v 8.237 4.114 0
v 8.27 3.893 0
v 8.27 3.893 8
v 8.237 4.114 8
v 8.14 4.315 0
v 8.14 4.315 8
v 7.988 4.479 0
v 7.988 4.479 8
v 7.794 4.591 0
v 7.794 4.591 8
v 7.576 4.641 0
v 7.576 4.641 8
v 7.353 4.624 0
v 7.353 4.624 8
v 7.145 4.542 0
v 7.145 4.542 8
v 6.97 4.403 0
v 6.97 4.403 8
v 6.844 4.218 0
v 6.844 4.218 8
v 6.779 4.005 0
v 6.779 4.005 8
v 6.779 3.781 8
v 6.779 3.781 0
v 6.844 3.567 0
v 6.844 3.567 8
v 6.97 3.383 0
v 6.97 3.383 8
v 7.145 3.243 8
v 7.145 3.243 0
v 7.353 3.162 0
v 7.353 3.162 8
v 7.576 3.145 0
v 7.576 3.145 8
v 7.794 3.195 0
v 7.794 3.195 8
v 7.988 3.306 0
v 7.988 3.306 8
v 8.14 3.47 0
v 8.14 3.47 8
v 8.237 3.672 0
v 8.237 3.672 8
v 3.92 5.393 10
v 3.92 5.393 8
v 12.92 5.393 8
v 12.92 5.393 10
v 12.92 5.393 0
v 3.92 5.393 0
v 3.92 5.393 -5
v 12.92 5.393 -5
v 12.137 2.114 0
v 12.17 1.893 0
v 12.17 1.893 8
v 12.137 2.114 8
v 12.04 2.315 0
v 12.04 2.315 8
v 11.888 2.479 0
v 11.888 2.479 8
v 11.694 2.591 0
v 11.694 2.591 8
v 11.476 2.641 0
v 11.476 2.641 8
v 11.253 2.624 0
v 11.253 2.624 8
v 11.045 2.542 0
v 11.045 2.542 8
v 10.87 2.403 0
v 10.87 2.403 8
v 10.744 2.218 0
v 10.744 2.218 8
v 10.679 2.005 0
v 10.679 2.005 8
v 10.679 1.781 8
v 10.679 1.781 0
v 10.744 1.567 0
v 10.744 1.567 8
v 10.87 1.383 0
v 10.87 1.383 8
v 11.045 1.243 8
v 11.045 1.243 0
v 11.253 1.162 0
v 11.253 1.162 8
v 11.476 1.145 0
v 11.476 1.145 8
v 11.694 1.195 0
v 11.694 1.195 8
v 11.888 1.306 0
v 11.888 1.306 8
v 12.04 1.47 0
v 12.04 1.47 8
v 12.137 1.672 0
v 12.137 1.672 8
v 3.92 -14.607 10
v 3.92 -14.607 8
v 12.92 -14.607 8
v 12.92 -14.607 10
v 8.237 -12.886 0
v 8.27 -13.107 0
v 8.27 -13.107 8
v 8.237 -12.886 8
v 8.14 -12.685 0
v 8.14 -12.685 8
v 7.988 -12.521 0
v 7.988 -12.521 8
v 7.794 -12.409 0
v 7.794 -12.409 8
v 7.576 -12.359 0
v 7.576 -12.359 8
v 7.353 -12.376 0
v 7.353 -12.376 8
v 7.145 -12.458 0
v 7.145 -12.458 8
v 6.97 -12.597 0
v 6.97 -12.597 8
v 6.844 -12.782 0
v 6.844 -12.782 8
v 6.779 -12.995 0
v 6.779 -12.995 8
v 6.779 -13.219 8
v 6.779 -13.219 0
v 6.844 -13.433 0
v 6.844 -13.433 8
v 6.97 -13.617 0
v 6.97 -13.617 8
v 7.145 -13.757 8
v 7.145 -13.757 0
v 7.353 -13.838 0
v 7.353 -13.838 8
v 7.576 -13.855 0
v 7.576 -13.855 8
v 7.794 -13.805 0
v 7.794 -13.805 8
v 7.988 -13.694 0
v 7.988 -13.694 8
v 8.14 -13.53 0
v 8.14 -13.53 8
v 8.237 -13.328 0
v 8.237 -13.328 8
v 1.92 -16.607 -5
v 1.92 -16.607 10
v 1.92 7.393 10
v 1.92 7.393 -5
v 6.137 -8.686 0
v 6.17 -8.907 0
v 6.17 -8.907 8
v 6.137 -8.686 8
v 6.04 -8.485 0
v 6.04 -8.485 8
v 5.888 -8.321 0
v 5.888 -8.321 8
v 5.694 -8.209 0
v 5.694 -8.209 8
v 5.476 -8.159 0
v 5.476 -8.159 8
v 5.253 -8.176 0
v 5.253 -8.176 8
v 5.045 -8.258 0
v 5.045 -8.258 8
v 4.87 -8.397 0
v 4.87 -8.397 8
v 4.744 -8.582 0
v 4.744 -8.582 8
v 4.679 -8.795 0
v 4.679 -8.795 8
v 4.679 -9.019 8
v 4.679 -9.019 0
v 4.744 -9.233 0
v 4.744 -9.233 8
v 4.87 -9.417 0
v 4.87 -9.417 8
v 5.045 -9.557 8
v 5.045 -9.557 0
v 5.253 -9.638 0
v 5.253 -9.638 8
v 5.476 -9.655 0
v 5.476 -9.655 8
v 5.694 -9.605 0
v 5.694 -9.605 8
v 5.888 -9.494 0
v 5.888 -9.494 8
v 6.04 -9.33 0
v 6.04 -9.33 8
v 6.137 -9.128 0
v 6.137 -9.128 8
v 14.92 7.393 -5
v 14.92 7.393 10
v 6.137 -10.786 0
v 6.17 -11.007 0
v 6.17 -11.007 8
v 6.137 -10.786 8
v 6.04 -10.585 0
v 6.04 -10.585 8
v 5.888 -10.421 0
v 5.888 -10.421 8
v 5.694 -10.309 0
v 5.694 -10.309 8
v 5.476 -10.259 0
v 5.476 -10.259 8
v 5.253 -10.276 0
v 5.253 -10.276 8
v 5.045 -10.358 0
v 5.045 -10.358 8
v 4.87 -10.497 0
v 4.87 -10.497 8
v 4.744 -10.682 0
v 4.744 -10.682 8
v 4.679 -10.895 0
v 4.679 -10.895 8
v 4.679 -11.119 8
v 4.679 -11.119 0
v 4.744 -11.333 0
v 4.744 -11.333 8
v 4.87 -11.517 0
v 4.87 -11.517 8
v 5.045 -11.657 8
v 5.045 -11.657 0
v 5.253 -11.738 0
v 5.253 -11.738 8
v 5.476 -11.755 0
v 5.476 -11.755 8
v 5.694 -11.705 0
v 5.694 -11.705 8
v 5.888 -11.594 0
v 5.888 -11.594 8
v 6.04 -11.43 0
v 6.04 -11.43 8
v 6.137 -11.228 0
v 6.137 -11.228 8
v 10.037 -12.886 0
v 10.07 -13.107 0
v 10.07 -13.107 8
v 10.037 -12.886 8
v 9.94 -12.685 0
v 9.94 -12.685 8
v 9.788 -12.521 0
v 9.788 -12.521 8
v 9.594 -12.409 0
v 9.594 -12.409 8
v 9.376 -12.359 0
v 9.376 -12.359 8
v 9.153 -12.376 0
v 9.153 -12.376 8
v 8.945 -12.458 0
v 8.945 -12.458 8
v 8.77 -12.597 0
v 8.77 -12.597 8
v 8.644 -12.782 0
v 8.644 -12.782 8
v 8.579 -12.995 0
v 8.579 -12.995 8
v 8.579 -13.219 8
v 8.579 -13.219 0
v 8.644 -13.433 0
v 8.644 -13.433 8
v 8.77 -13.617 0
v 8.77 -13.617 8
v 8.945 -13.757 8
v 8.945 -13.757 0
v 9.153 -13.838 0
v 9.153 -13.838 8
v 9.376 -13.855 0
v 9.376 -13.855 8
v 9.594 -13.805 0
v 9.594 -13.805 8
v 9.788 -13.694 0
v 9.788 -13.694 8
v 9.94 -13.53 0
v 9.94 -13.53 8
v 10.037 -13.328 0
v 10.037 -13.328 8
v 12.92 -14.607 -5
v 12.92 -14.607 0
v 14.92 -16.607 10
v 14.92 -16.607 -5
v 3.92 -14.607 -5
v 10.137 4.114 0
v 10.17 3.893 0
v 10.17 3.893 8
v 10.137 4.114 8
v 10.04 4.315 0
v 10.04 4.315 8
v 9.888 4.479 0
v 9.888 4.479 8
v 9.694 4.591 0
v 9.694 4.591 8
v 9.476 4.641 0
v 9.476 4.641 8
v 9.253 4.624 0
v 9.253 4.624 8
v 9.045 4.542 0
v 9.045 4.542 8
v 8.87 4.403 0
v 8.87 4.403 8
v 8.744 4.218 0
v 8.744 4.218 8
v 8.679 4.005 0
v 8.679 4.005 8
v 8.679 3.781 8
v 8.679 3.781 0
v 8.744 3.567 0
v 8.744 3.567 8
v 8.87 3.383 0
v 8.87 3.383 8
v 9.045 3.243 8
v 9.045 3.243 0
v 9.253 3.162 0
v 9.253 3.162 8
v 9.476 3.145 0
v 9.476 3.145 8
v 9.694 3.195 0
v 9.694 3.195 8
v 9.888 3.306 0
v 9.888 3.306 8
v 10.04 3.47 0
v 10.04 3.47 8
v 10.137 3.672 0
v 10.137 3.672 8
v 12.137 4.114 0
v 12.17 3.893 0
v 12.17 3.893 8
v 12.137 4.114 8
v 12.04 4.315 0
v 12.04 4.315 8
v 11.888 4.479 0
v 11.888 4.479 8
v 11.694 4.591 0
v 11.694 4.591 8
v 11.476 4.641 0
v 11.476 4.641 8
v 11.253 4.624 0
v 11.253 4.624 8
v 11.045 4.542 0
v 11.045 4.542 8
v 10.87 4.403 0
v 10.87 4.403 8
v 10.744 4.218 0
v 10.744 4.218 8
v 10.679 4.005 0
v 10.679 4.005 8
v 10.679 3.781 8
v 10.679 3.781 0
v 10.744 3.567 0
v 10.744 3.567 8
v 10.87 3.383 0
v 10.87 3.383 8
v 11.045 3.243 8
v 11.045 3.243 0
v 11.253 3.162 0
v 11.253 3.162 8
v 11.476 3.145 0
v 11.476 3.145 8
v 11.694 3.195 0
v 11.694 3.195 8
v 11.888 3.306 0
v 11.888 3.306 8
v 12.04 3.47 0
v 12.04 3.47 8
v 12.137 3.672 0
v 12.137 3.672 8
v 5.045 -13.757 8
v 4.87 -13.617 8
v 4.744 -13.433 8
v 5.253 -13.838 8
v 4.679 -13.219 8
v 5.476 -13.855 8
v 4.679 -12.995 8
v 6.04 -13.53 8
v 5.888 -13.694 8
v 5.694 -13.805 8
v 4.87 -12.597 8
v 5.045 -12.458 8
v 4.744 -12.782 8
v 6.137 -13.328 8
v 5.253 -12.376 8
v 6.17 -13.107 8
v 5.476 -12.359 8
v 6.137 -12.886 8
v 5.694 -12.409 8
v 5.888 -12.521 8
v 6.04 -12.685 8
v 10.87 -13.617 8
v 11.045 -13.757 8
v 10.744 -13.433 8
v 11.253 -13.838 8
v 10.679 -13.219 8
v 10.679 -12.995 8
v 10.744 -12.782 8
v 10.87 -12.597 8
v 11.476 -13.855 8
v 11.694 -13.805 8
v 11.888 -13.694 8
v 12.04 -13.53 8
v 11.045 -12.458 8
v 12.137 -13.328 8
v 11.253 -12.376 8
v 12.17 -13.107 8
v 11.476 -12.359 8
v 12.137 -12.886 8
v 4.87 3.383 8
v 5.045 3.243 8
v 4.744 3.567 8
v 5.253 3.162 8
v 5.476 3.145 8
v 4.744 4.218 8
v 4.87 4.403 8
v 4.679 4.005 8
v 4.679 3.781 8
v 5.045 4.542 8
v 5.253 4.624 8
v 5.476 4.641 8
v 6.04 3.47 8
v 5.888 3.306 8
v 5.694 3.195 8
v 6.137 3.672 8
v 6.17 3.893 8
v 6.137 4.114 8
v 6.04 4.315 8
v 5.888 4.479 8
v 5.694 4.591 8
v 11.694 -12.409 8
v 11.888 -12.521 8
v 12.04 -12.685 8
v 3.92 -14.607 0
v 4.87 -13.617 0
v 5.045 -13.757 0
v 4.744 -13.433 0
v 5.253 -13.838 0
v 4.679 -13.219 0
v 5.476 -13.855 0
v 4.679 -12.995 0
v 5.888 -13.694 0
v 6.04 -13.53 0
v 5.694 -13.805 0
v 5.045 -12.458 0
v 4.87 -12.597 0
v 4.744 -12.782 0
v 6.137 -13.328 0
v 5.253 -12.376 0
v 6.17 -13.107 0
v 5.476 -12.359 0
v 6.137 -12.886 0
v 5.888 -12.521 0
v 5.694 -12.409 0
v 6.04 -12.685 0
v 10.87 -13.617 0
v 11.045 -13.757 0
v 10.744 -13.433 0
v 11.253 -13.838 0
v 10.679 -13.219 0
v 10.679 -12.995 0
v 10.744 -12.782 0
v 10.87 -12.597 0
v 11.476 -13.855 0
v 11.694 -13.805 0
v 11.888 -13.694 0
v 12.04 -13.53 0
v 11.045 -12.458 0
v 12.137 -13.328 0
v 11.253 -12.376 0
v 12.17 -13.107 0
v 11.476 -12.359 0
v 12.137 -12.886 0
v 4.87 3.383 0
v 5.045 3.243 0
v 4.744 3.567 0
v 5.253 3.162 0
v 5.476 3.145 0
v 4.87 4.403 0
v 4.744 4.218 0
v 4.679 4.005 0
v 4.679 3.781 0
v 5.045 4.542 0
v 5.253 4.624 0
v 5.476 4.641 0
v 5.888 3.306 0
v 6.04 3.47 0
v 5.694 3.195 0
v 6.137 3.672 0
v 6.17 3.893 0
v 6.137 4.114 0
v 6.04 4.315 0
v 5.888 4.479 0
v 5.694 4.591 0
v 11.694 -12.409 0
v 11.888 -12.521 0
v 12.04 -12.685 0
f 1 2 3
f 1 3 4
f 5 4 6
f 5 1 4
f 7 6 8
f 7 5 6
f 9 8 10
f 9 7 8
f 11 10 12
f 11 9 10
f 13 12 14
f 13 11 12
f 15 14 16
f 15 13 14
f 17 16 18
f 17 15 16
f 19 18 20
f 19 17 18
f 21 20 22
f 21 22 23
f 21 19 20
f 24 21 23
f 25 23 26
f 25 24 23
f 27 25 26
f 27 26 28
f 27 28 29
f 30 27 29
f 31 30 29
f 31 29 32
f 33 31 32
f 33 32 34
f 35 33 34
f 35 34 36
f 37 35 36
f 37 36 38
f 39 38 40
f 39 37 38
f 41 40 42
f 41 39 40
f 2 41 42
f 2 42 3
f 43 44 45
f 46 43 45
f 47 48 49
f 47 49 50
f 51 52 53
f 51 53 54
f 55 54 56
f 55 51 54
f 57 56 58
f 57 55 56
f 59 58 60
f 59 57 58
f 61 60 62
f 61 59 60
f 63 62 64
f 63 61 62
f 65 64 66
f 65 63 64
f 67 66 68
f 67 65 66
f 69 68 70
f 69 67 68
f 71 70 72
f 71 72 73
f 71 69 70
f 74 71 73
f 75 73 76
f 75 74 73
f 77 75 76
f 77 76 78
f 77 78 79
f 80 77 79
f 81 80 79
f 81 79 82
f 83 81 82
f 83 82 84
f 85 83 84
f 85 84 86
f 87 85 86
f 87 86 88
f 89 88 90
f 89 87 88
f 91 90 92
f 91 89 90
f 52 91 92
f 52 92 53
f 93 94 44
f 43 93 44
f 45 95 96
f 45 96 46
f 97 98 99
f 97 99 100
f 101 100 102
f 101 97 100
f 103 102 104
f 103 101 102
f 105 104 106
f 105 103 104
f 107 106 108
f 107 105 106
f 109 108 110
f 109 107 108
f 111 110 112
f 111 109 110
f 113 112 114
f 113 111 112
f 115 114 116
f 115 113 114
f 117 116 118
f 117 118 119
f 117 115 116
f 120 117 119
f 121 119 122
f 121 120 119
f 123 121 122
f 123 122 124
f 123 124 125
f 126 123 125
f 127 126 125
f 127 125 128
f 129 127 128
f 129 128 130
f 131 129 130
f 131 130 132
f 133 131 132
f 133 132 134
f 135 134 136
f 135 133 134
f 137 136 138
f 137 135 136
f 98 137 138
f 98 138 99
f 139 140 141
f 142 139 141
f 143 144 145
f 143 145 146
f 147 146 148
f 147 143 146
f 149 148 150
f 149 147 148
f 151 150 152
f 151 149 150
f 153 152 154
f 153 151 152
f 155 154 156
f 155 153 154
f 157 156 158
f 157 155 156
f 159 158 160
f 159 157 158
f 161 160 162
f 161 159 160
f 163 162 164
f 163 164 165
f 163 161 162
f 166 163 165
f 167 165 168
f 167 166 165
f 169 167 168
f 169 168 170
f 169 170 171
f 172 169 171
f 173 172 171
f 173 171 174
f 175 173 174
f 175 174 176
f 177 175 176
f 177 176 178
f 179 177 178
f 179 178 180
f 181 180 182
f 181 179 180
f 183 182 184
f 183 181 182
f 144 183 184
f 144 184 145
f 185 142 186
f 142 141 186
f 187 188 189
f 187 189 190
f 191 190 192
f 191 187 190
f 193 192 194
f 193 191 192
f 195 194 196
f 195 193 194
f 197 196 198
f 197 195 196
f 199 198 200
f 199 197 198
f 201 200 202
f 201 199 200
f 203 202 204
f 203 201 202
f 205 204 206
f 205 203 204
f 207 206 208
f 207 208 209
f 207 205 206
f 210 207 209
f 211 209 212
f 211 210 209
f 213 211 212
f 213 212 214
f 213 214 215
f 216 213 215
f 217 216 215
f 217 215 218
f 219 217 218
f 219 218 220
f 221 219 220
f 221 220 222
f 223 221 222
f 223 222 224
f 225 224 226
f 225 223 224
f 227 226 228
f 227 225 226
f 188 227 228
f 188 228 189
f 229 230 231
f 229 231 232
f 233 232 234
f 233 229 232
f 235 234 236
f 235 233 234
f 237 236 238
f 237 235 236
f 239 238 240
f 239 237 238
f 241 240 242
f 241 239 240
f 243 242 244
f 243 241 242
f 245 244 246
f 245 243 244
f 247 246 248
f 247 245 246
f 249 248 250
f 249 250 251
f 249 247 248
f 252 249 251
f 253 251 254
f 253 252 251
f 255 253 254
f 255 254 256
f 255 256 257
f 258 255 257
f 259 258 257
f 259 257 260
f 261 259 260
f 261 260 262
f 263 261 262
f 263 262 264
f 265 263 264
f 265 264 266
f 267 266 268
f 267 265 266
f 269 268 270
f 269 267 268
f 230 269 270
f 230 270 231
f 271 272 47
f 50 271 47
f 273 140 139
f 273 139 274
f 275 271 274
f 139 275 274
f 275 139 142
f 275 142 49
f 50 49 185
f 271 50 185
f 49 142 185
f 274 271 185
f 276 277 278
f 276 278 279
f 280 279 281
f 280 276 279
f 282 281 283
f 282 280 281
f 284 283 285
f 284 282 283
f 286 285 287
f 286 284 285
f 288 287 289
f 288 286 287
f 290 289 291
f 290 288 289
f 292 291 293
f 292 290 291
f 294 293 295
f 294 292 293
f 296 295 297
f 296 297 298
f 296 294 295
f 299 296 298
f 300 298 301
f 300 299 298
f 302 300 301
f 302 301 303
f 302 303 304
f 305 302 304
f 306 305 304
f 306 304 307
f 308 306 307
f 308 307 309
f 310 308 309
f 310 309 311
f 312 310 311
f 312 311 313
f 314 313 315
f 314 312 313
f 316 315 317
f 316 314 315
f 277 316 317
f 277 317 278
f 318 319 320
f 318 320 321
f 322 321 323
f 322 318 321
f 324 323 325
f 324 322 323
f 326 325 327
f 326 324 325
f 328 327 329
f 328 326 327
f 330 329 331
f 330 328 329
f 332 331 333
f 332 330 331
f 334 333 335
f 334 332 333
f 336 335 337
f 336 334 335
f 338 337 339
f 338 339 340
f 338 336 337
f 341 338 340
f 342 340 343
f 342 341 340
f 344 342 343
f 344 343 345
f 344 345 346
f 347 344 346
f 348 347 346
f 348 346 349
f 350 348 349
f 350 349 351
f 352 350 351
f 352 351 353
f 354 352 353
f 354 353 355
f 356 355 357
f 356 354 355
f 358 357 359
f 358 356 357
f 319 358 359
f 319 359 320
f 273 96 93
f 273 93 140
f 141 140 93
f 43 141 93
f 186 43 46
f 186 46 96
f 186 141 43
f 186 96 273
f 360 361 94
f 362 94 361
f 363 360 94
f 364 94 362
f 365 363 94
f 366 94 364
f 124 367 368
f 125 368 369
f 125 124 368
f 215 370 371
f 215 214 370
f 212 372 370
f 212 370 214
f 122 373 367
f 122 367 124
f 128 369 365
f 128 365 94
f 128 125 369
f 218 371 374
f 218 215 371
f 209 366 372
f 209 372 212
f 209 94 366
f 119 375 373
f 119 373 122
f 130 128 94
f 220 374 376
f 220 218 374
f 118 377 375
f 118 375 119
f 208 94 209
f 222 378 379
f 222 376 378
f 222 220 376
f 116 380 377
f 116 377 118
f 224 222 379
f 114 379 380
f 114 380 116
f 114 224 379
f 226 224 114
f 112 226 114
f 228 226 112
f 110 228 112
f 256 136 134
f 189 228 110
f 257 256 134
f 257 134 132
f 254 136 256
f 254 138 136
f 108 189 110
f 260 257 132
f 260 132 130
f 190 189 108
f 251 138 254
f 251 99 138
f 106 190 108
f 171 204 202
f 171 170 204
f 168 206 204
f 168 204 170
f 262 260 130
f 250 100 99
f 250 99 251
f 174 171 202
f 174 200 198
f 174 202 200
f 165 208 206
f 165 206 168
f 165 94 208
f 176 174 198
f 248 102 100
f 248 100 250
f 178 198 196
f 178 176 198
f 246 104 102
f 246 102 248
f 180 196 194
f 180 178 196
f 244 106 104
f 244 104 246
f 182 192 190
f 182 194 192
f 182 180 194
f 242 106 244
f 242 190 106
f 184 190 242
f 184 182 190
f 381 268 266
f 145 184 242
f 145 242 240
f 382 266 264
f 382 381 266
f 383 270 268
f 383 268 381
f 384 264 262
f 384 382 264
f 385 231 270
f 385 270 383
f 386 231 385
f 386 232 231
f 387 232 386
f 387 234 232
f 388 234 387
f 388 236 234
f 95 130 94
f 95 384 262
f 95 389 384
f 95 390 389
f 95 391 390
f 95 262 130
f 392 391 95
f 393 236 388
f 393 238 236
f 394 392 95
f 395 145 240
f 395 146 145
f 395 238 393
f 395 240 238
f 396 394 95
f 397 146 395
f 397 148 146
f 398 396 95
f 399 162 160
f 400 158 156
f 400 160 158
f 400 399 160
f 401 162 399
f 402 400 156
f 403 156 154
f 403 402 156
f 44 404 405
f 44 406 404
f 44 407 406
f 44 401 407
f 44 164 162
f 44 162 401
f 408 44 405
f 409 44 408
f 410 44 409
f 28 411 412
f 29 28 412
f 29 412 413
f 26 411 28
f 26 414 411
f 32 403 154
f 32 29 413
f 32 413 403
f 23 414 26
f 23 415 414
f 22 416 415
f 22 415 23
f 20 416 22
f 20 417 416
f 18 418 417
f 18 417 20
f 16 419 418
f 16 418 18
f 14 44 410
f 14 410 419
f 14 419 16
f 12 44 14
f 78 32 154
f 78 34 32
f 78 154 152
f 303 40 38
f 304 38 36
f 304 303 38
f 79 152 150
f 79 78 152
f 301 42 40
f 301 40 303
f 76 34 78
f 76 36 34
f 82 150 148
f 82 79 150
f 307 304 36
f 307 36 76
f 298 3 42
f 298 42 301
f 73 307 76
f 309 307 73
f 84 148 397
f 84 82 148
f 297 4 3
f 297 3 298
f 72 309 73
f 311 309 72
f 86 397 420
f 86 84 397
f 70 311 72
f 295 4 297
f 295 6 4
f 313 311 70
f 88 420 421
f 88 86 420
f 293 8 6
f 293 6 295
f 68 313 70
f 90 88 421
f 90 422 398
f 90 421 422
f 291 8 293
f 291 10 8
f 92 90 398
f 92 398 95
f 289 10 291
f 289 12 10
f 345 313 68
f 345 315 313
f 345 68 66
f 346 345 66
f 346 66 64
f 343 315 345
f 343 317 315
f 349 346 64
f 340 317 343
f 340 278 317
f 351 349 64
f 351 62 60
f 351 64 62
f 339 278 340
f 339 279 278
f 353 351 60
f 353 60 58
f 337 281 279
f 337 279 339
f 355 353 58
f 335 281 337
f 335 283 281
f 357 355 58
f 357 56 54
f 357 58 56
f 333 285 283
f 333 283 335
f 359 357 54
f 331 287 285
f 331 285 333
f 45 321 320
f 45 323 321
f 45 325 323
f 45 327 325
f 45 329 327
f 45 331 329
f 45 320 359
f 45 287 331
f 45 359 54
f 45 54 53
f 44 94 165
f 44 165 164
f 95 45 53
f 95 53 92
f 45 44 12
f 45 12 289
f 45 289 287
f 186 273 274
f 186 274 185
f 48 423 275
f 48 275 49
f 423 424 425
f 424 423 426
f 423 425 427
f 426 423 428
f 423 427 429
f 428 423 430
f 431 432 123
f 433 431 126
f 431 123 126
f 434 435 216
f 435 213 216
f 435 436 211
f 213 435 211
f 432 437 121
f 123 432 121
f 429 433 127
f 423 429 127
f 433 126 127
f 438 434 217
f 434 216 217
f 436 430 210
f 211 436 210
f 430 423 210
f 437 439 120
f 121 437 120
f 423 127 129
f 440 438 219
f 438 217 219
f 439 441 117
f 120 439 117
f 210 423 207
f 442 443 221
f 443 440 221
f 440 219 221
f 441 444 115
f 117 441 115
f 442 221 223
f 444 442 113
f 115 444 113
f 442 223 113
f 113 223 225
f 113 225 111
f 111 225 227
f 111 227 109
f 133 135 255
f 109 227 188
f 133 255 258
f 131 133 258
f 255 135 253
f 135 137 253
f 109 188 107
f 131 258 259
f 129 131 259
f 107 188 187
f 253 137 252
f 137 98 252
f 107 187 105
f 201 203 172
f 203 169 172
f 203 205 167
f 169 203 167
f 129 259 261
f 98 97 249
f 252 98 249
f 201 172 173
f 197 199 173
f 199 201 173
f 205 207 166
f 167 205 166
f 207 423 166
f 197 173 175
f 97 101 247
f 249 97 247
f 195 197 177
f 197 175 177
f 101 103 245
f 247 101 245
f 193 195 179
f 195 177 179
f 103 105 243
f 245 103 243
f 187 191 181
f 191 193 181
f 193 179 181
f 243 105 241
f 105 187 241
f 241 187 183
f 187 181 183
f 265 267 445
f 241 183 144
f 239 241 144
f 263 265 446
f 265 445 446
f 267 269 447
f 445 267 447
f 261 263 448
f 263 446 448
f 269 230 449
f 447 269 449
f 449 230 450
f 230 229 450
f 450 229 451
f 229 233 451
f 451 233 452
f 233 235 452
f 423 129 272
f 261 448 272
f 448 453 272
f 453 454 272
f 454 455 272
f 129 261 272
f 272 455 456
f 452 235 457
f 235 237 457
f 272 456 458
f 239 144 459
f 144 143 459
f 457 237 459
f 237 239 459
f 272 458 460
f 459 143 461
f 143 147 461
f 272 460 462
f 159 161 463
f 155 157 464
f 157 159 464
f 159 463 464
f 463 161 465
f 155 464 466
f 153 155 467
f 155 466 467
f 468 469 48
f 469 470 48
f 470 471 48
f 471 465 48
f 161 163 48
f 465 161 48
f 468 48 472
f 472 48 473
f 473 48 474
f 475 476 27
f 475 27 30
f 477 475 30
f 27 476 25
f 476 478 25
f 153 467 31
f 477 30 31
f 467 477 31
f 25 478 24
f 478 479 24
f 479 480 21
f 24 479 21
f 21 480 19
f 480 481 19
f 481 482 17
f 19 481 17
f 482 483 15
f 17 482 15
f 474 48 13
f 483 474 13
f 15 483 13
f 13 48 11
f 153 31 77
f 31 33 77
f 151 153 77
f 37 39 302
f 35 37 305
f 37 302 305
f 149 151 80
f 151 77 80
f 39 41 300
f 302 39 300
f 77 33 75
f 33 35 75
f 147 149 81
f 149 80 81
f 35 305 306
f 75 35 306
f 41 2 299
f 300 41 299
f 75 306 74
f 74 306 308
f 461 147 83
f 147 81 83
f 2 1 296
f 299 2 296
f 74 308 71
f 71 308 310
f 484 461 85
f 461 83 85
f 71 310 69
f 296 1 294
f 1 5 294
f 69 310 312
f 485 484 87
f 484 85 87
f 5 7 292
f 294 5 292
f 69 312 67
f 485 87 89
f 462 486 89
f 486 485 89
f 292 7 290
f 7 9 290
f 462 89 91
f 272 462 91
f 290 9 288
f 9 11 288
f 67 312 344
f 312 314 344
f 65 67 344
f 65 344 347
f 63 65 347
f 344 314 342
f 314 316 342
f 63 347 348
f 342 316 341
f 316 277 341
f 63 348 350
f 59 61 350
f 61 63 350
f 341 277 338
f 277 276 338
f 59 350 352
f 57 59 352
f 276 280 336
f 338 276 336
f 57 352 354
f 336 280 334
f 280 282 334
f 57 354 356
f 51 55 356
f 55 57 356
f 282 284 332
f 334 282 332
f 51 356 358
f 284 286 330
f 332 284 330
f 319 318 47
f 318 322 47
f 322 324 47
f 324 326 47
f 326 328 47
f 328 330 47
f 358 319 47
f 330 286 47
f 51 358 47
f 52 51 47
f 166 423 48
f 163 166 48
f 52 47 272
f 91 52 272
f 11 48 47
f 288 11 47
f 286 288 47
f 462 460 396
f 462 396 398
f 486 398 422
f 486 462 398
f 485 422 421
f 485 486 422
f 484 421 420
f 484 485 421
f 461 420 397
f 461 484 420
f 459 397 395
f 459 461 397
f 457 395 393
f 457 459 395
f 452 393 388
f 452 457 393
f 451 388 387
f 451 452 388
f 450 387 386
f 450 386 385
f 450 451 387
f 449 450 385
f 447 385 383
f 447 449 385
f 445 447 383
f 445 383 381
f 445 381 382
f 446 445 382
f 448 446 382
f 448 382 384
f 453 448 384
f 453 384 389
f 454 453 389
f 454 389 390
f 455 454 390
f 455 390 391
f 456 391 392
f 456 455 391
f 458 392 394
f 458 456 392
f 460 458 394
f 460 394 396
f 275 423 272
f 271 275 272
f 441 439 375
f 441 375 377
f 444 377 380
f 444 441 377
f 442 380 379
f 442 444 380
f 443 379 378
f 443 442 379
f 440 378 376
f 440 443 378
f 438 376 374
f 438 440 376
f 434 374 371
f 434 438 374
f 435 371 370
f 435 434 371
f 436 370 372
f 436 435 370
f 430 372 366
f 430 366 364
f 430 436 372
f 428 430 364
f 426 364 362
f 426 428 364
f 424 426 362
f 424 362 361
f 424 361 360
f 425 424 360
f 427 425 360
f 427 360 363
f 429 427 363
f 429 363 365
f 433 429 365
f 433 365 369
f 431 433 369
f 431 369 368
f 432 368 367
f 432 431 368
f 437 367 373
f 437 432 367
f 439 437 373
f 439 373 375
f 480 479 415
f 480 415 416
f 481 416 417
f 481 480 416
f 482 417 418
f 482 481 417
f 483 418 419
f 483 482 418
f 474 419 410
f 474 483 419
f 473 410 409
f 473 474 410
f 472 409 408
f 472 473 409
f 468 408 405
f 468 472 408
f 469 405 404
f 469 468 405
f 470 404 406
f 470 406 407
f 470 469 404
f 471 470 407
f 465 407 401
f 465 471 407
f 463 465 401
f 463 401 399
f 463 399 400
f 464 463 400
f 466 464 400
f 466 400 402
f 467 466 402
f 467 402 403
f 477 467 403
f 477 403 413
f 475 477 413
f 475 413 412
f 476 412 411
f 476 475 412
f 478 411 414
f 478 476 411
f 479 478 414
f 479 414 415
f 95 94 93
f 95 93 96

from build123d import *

# Parameters (mm, degrees)
F0_W     = 13
F0_H     = 24
F0_W_2   = 9
F0_H_2   = 20
F1_DEPTH = 10
F0_R     = 0.75
F2_DEPTH = 8
F3_DEPTH = 5


with BuildPart() as f1:
    # F0 (on Top) → F1 (new body)
    with BuildSketch(Plane.XY):
        with Locations((8.4202193944, -4.6071633101)):
            Rectangle(F0_W, F0_H)
        with Locations((8.4202193944, -4.6071633101)):
            Rectangle(F0_W_2, F0_H_2, mode=Mode.SUBTRACT)
    extrude(amount=F1_DEPTH)

    # F0 (on Top) → F2 (join)
    with BuildSketch(Plane.XY):
        with Locations((8.4202193944, -4.6071633101)):
            Rectangle(F0_W, F0_H)
        with Locations((8.4202193944, -4.6071633101)):
            Rectangle(F0_W_2, F0_H_2, mode=Mode.SUBTRACT)
        with Locations((8.4202193944, -4.6071633101)):
            Rectangle(F0_W_2, F0_H_2)
        with Locations((5.4202193944, -13.1071633101)):
            Circle(F0_R, mode=Mode.SUBTRACT)
        with Locations((5.4202193944, -11.0071633101)):
            Circle(F0_R, mode=Mode.SUBTRACT)
        with Locations((7.5202193944, -13.1071633101)):
            Circle(F0_R, mode=Mode.SUBTRACT)
        with Locations((5.4202193944, -8.9071633101)):
            Circle(F0_R, mode=Mode.SUBTRACT)
        with Locations((9.3202193944, -13.1071633101)):
            Circle(F0_R, mode=Mode.SUBTRACT)
        with Locations((11.4202193944, -13.1071633101)):
            Circle(F0_R, mode=Mode.SUBTRACT)
        with Locations((5.4202193944, 3.8928366899)):
            Circle(F0_R, mode=Mode.SUBTRACT)
        with Locations((7.5202193944, 3.8928366899)):
            Circle(F0_R, mode=Mode.SUBTRACT)
        with Locations((9.4202193944, 3.8928366899)):
            Circle(F0_R, mode=Mode.SUBTRACT)
        with Locations((11.4202193944, 1.8928366899)):
            Circle(F0_R, mode=Mode.SUBTRACT)
        with Locations((11.4202193944, 3.8928366899)):
            Circle(F0_R, mode=Mode.SUBTRACT)
    extrude(amount=F2_DEPTH)

    # F0 (on Top) → F3 (join)
    with BuildSketch(Plane.XY):
        with Locations((8.4202193944, -4.6071633101)):
            Rectangle(F0_W, F0_H)
        with Locations((8.4202193944, -4.6071633101)):
            Rectangle(F0_W_2, F0_H_2, mode=Mode.SUBTRACT)
    extrude(amount=-F3_DEPTH)


solid = f1.part
